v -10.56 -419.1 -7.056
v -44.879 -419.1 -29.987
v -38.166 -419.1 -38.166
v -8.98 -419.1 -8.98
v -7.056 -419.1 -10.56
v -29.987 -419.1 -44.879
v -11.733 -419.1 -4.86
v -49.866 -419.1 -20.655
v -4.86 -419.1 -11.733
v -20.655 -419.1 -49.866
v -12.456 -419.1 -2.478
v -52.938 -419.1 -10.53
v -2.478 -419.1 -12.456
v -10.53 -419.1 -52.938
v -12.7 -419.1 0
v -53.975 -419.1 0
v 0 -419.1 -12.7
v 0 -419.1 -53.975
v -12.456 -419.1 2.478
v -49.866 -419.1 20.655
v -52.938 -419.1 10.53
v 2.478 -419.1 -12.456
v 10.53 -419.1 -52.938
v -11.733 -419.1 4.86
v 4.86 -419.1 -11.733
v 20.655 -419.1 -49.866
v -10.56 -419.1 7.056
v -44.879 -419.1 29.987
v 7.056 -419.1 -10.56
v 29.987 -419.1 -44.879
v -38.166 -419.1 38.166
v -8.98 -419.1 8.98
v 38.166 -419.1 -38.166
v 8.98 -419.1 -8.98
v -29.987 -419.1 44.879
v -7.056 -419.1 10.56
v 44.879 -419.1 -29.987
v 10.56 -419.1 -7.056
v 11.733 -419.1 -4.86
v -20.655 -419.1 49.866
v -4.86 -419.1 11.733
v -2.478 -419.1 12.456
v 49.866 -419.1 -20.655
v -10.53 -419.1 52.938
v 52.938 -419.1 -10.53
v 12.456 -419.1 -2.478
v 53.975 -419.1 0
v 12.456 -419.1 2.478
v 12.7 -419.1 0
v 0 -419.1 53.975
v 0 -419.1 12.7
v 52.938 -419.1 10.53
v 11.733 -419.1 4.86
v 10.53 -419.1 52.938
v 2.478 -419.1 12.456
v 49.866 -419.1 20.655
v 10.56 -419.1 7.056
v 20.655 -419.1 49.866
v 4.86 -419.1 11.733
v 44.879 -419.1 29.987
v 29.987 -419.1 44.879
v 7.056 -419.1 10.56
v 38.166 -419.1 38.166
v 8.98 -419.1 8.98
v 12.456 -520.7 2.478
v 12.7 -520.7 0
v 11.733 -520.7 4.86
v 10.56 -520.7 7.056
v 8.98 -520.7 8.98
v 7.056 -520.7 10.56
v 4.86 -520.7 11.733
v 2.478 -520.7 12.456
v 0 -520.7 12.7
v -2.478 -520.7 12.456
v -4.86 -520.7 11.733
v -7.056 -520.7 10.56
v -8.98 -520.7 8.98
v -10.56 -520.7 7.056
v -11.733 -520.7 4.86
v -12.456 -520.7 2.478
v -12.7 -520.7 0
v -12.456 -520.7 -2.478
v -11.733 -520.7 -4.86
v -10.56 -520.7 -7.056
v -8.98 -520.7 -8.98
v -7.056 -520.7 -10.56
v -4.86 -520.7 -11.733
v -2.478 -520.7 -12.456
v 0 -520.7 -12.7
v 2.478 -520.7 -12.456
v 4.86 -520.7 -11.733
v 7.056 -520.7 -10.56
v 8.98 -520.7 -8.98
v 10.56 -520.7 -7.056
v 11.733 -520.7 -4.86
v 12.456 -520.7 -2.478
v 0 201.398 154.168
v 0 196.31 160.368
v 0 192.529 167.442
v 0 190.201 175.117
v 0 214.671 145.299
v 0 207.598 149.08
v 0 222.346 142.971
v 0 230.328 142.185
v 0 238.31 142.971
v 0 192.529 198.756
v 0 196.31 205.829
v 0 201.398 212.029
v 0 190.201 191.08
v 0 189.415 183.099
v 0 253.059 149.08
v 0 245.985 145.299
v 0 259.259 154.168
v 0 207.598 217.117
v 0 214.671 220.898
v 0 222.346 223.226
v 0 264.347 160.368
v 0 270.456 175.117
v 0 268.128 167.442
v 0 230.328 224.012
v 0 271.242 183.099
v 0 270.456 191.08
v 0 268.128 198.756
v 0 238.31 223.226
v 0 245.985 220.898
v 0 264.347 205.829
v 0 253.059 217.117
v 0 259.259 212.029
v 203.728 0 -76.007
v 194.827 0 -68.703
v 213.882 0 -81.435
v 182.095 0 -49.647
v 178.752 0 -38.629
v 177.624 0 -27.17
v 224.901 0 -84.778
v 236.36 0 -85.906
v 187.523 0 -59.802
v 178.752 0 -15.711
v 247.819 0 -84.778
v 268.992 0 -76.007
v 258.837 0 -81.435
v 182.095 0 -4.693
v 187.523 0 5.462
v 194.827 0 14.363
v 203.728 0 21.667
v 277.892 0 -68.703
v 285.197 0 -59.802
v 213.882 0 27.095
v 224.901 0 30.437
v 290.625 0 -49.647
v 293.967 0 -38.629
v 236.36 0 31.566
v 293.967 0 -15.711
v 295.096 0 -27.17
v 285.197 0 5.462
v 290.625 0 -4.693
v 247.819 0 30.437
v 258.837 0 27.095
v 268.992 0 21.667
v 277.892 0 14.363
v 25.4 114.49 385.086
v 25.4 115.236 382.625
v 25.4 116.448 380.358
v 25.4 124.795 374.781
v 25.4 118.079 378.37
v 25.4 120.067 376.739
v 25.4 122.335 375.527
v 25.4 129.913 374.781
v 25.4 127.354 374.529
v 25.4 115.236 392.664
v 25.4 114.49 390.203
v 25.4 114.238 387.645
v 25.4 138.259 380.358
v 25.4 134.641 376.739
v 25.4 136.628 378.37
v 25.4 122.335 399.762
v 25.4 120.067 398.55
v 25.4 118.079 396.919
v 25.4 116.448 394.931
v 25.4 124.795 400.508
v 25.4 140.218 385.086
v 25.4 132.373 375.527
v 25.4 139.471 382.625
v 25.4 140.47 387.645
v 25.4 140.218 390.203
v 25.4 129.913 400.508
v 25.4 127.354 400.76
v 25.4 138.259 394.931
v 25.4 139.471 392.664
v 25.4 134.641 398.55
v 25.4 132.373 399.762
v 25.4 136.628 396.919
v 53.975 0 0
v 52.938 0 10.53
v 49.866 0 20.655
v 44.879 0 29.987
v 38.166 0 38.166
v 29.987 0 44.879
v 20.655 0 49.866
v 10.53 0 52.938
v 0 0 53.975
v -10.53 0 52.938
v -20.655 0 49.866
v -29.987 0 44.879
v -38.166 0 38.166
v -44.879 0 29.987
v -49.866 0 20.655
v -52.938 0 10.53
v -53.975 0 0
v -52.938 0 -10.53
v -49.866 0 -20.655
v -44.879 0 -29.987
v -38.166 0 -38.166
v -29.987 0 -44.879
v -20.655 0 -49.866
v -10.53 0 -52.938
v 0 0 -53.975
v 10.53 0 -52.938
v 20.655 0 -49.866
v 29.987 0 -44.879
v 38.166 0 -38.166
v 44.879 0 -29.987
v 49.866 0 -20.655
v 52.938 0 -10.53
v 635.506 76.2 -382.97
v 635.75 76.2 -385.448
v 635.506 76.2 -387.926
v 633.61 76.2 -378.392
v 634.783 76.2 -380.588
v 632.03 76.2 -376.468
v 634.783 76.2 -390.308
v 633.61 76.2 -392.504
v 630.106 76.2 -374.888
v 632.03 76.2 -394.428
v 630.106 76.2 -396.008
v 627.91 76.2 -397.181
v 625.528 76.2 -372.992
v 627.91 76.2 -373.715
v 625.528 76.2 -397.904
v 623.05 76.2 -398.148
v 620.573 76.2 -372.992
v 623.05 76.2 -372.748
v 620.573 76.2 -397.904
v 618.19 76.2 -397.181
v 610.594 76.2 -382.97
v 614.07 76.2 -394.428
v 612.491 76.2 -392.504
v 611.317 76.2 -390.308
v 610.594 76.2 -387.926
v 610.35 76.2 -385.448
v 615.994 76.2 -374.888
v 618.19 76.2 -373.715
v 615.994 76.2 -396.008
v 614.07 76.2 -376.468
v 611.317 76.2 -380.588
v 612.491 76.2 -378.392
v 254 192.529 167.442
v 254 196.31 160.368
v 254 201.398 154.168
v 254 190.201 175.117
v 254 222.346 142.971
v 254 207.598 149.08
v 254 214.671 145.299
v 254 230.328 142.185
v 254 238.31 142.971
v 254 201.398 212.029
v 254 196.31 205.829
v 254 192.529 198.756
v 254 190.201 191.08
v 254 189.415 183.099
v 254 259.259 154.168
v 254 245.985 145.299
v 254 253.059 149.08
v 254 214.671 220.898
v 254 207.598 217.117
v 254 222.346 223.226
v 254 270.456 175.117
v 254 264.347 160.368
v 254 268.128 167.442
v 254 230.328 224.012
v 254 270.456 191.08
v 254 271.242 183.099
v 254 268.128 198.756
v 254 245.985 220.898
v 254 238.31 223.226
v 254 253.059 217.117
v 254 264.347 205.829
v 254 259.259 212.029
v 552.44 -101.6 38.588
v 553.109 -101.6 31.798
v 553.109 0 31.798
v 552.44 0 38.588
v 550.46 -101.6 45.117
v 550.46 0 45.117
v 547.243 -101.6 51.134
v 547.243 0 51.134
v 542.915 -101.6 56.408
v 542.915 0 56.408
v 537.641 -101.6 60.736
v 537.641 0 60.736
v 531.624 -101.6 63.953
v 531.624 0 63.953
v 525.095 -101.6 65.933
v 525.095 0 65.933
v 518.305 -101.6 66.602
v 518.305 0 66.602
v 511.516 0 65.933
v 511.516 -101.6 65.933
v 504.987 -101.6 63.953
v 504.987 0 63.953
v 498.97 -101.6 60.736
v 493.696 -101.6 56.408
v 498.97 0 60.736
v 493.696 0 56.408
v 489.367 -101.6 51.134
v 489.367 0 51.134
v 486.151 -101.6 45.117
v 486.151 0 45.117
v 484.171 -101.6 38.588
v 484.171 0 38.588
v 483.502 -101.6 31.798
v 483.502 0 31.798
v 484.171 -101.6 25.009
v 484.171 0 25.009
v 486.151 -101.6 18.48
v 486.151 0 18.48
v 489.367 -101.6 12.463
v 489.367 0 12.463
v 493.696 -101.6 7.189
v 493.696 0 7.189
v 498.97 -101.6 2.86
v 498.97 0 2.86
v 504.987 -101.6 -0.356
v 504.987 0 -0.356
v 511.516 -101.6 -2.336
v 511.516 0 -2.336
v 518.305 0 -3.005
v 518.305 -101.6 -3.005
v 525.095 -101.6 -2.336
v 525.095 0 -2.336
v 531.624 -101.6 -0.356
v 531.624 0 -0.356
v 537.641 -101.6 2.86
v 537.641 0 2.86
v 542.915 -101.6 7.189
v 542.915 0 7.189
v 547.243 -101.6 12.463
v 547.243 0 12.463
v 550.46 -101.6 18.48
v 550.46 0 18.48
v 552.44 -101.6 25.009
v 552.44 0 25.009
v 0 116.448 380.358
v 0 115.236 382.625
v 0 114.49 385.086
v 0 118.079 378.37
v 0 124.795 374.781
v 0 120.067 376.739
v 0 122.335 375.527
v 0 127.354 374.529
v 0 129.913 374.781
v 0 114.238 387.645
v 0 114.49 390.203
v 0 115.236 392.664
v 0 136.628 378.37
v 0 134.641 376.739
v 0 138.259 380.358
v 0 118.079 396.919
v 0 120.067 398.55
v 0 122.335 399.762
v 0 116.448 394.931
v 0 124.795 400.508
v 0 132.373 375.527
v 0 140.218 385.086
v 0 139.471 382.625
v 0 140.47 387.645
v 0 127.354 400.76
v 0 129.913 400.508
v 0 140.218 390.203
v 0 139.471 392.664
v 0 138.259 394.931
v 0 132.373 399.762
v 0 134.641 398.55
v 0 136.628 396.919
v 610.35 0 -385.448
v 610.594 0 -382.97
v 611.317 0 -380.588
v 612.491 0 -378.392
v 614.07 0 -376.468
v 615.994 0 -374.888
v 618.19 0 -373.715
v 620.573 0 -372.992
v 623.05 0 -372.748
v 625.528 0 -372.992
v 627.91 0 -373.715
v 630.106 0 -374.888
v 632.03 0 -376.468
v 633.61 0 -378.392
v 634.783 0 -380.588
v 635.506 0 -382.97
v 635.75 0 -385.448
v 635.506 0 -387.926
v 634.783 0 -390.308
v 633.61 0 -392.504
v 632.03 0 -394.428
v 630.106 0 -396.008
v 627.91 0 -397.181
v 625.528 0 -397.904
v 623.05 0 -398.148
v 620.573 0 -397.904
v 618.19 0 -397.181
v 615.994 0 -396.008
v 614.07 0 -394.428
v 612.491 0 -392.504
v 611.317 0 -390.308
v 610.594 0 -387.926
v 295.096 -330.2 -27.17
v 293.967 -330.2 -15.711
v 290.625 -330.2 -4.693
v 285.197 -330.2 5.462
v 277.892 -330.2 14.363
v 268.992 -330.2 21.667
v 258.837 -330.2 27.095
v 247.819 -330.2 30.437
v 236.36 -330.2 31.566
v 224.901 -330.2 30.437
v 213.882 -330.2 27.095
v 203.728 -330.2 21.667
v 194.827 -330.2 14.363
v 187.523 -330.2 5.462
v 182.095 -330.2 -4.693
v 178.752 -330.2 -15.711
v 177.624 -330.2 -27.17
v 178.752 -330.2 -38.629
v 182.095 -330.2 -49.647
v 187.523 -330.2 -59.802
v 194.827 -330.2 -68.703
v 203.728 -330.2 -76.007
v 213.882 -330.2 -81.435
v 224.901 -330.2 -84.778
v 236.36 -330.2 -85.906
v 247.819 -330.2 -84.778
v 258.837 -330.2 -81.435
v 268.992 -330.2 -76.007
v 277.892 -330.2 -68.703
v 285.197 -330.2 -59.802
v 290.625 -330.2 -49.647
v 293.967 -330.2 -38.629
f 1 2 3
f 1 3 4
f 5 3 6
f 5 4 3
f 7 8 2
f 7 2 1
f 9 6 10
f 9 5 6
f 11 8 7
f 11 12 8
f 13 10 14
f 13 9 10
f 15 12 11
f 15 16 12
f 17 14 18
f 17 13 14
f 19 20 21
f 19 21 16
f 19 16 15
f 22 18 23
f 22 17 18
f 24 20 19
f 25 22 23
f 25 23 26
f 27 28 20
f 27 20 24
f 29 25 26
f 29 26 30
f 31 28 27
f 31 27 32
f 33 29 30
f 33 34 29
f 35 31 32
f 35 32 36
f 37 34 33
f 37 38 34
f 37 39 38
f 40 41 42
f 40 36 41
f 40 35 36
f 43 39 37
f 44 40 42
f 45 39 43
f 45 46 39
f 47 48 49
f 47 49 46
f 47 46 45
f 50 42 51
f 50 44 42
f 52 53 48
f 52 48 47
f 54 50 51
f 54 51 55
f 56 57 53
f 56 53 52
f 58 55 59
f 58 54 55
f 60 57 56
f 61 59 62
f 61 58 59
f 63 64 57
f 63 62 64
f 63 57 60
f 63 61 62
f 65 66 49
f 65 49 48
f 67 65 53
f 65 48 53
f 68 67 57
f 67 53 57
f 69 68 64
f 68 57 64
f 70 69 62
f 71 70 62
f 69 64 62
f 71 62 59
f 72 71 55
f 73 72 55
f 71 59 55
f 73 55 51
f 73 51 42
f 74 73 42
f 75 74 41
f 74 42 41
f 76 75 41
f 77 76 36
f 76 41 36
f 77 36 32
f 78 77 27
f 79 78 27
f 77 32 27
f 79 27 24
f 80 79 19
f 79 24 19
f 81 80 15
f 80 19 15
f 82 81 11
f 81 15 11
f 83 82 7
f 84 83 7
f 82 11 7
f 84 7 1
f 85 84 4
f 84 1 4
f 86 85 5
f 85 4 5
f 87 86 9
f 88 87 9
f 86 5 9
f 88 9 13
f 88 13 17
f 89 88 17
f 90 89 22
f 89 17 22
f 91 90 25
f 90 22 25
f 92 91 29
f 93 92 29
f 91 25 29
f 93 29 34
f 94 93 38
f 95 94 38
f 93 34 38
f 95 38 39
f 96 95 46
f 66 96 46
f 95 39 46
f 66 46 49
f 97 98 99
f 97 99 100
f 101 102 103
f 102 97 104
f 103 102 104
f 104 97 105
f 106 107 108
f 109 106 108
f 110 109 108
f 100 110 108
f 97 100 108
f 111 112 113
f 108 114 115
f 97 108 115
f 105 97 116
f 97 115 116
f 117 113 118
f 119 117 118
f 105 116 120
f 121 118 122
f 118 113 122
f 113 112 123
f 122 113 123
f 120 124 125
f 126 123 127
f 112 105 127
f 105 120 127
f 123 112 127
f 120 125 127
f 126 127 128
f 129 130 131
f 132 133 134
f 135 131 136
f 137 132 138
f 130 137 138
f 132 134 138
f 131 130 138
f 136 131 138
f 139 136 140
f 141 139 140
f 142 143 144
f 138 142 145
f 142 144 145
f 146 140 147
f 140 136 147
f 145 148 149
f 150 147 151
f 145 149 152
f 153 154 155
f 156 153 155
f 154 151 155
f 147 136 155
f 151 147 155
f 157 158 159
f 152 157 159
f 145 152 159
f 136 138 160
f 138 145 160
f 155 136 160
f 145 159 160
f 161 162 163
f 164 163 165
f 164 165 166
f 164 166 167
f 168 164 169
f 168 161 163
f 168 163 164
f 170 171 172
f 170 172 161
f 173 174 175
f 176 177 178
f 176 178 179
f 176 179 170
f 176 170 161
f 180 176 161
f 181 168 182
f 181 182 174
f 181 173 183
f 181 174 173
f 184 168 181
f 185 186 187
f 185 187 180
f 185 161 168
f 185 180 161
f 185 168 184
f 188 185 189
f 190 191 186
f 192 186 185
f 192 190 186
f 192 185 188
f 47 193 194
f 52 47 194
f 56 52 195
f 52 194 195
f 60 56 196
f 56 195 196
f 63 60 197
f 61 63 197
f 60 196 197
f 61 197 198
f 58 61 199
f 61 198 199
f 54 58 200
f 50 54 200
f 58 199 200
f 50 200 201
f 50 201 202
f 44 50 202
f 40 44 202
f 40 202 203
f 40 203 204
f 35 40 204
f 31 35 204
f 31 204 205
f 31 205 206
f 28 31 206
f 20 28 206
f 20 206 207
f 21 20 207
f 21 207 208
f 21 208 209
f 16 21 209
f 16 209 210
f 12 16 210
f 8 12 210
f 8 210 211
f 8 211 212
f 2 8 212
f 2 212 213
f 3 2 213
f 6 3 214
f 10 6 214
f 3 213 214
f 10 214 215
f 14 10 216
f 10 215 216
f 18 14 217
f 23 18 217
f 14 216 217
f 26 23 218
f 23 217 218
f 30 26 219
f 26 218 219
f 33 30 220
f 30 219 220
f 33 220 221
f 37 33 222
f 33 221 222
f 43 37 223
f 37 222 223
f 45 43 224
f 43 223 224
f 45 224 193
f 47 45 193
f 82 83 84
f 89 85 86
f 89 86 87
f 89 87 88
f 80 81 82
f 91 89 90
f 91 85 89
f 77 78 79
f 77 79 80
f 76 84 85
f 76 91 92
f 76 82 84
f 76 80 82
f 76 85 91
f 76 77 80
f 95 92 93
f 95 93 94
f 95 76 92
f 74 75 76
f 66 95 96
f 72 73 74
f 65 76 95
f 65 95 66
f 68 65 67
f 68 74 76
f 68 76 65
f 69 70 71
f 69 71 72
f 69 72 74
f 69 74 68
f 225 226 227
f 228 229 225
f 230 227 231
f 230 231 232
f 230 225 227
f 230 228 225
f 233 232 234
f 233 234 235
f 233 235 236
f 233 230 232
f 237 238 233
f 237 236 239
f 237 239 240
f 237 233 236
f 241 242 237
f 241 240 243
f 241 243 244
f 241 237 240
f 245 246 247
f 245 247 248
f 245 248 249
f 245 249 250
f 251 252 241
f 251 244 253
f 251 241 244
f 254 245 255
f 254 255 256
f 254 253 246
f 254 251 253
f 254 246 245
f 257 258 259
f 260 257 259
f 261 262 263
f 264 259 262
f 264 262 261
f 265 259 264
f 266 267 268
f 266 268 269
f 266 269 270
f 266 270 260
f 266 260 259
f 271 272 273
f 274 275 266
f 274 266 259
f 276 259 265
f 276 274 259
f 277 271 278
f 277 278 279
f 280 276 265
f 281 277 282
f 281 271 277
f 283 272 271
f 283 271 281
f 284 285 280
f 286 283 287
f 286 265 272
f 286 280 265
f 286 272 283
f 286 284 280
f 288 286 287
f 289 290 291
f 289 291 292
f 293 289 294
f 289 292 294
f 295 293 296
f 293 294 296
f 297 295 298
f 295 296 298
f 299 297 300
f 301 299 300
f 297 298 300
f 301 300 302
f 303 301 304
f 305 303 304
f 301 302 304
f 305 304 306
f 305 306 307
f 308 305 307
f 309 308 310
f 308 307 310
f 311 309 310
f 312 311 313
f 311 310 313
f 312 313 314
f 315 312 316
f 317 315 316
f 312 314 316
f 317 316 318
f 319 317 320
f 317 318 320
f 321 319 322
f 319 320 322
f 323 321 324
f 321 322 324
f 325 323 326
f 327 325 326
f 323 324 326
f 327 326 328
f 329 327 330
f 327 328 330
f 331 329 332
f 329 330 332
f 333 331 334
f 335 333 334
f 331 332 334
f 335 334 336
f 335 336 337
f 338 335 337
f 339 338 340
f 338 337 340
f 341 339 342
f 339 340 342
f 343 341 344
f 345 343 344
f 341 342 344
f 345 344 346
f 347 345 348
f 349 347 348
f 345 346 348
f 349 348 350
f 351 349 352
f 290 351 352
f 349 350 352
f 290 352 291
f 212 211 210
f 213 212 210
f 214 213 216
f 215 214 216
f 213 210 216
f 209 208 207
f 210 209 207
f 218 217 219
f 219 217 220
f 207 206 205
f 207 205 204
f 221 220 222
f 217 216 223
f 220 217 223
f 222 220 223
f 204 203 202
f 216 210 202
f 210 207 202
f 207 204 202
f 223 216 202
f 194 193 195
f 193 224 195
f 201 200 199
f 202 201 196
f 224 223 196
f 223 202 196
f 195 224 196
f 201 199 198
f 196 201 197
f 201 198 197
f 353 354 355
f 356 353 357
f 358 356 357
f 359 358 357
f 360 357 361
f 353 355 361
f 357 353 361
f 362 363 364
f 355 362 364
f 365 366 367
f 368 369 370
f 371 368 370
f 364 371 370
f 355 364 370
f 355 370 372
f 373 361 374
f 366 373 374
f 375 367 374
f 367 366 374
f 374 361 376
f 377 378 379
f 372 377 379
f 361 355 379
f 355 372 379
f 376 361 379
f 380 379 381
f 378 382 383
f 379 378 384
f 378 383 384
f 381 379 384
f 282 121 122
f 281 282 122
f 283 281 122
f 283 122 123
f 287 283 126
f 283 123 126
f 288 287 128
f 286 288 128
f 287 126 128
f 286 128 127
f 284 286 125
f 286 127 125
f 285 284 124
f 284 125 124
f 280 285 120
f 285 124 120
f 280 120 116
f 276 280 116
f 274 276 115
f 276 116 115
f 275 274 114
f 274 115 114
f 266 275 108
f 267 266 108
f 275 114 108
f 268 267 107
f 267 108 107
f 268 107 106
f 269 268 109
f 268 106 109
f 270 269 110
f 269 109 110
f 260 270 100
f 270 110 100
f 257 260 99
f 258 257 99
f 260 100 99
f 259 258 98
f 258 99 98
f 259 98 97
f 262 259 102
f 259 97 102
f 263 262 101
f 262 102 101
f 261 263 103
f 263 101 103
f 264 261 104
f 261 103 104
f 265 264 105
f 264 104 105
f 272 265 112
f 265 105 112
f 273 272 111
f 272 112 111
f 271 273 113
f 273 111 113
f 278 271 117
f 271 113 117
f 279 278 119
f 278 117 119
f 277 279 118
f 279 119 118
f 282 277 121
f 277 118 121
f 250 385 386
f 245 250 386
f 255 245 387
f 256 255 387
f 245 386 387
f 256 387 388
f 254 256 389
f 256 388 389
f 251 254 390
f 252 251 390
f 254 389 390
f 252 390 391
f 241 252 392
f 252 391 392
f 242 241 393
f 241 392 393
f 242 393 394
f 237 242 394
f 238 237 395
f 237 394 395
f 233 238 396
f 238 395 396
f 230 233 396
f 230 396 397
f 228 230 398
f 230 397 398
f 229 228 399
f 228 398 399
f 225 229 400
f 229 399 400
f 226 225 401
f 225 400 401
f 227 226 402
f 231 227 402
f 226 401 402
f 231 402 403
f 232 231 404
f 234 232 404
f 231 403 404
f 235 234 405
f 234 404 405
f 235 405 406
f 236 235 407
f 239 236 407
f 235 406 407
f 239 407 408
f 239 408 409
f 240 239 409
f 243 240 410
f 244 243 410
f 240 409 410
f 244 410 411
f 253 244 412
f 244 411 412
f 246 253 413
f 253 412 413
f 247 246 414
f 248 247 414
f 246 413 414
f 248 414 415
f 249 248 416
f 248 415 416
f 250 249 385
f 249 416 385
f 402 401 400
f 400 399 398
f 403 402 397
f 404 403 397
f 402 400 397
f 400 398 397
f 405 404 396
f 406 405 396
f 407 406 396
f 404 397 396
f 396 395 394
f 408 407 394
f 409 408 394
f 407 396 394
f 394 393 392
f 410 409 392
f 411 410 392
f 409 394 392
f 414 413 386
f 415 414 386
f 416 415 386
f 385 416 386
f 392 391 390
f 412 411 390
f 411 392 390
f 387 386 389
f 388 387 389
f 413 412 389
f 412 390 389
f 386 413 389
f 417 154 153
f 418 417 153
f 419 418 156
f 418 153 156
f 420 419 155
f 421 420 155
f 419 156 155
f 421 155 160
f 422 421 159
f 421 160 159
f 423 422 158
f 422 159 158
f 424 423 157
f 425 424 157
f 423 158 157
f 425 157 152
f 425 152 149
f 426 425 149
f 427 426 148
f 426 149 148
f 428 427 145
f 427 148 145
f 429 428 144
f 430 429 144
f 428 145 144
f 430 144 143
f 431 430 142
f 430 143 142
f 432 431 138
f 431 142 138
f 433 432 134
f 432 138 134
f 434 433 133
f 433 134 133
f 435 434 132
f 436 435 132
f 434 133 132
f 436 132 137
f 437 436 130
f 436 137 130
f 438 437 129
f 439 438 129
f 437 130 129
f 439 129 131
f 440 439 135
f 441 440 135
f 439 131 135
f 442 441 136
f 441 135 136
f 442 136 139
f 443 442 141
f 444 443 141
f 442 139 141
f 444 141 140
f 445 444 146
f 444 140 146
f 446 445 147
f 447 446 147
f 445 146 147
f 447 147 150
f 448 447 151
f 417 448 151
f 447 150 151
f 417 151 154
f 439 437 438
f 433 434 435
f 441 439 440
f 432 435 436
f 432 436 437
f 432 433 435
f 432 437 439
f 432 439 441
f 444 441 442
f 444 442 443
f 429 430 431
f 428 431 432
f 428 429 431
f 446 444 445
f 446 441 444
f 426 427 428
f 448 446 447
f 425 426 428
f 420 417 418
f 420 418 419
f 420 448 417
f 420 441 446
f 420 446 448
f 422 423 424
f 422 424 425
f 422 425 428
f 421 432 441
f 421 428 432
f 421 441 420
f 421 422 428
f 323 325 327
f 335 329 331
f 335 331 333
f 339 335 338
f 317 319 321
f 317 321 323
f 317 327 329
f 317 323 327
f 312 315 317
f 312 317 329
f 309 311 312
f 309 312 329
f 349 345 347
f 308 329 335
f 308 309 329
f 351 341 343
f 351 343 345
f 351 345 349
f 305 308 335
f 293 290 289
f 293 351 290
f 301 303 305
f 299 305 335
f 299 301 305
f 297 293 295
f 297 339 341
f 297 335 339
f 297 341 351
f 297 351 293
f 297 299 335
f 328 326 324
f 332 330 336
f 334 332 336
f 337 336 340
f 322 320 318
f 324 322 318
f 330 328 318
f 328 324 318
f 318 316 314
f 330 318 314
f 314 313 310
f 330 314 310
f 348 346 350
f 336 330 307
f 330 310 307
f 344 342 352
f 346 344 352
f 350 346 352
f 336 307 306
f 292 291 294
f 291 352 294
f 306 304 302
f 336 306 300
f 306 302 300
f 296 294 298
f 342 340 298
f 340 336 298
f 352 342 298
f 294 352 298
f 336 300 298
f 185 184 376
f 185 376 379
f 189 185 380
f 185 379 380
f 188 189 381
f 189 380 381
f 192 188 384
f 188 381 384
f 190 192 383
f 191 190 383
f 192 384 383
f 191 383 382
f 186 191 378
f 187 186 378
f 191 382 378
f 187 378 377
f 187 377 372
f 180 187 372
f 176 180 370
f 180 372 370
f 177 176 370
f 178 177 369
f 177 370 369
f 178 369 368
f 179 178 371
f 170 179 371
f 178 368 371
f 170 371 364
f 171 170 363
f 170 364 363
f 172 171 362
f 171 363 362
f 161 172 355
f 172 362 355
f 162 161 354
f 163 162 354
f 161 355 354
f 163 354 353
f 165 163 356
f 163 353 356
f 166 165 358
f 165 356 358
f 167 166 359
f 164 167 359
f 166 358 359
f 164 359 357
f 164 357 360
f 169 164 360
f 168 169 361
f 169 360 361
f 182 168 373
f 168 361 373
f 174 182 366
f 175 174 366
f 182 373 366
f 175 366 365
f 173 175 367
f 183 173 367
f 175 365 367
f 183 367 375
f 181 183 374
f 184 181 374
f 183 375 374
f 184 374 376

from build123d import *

# Parameters (mm, degrees)
F0_R      = 53.975
F1_DEPTH  = 419.1
F2_R      = 12.7
F3_DEPTH  = 101.6
F4_R      = 40.9136311109
F5_DEPTH  = 254
F6_R      = 13.1158886666
F7_DEPTH  = 25.4
F8_DEPTH  = 25.4
F9_R      = 12.7
F10_DEPTH = 76.2
F11_R     = 34.8034548998
F12_DEPTH = 101.6
F13_R     = 58.7360473688
F15_DEPTH = 330.2


# Not quite as in the source:
# - a feature names something its author has since deleted; it is built from what else it names
# - the program builds the solid bodies; features that only make, move or delete a surface that nothing else refers to are left out


with BuildPart() as f1:
    # F0 (on Front) → F1 (new body)
    with BuildSketch(Plane.XZ):
        Circle(F0_R)
    extrude(amount=F1_DEPTH)

    # F2 (on face) → F3 (join)
    with BuildSketch(Plane.XZ.offset(419.1)):
        Circle(F2_R)
    extrude(amount=F3_DEPTH)

    # F0 (on Front) → F8 (join)
    with BuildSketch(Plane.XZ):
        Circle(F0_R)
    extrude(amount=F8_DEPTH)


with BuildPart() as f5:
    # F4 (on Right) → F5 (new body)
    with BuildSketch(Plane.YZ):
        with Locations((230.3282767534, 183.0985844135)):
            Circle(F4_R)
    extrude(amount=F5_DEPTH)


with BuildPart() as f7:
    # F6 (on Right) → F7 (new body)
    with BuildSketch(Plane.YZ):
        with Locations((127.3537427187, 387.6445889473)):
            Circle(F6_R)
    extrude(amount=F7_DEPTH)


with BuildPart() as f10:
    # F9 (on face) → F10 (new body)
    with BuildSketch(Plane(origin=(0, 0, 0), x_dir=(-1, 0, 0), z_dir=(0, 1, 0))):
        with Locations((-623.0502128601, -385.4478597641)):
            Circle(F9_R)
    extrude(amount=F10_DEPTH)


with BuildPart() as f12:
    # F11 (on Front) → F12 (new body)
    with BuildSketch(Plane.XZ):
        with Locations((518.3054804802, 31.798414886)):
            Circle(F11_R)
    extrude(amount=F12_DEPTH)


with BuildPart() as f15:
    # F13 (on Front) → F15 (new body)
    with BuildSketch(Plane.XZ):
        with Locations((236.3598048687, -27.1700881422)):
            Circle(F13_R)
    extrude(amount=F15_DEPTH)


solid = Compound([f1.part, f5.part, f7.part, f10.part, f12.part, f15.part])
